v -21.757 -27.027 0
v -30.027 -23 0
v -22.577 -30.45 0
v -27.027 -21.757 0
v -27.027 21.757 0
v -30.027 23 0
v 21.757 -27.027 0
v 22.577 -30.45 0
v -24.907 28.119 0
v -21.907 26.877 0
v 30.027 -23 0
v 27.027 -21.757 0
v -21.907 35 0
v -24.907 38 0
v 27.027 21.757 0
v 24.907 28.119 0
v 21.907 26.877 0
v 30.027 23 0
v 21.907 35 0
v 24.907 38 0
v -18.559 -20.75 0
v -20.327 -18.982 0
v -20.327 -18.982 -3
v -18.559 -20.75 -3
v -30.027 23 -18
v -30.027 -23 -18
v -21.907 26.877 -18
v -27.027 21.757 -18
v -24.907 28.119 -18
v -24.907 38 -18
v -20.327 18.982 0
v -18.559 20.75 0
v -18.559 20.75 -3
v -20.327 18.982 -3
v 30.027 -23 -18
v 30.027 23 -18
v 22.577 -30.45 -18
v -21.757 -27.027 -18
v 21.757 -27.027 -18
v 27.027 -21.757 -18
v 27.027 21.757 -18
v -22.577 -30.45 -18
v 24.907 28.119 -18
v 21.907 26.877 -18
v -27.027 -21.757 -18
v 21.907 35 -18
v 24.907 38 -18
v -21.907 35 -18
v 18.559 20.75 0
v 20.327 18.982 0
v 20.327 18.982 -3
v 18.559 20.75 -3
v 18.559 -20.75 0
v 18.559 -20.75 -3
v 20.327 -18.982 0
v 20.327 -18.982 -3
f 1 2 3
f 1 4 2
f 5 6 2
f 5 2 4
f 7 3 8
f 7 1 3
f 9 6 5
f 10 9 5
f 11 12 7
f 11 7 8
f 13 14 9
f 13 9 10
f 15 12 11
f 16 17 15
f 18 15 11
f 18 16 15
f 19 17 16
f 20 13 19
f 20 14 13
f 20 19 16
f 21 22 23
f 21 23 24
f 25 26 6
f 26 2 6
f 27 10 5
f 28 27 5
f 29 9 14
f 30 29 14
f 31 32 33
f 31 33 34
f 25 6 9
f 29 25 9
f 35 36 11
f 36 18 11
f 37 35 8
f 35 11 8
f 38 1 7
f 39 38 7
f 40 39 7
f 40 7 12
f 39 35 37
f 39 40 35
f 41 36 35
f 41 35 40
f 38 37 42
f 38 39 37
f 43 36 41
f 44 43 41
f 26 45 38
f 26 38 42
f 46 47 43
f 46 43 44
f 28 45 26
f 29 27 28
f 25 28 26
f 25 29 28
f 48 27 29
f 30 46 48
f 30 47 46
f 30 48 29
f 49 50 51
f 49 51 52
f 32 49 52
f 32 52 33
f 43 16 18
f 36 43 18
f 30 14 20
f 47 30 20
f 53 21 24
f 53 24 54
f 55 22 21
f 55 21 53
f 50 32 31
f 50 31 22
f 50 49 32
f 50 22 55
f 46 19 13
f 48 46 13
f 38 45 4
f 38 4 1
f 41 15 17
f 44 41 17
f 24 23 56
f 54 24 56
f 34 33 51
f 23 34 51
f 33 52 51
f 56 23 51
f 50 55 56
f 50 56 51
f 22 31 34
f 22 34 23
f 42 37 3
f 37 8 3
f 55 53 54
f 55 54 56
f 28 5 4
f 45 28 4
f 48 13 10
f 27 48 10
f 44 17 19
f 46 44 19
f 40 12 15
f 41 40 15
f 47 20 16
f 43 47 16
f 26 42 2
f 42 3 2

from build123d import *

# Parameters (mm, degrees)
SALIENTE_EXTRUIR1_DEPTH   = 3
SALIENTE_EXTRUIR1_2_DEPTH = 3
SALIENTE_EXTRUIR3_DEPTH   = 15


with BuildPart() as part:
    # Croquis1 → Saliente-Extruir1 (new body)
    with BuildSketch(Plane.XY):
        Polygon((-24.907301525, 28.119315281), (-30.026512204, 23.000104602), (-30.026512204, -23.000104602), (-22.576616806, -30.45), (22.576616806, -30.45), (30.026512204, -23.000104602), (30.026512204, 23.000104602), (24.907301525, 28.119315281), (24.907301525, 38), (-24.907301525, 38), align=None)
        Polygon((-21.907301525, 26.876674594), (-27.026512204, 21.757463915), (-27.026512204, -21.757463915), (-21.757463915, -27.026512204), (21.757463915, -27.026512204), (27.026512204, -21.757463915), (27.026512204, 21.757463915), (21.907301525, 26.876674594), (21.907301525, 35), (-21.907301525, 35), align=None, mode=Mode.SUBTRACT)
    extrude(amount=-SALIENTE_EXTRUIR1_DEPTH)

    # Croquis2 → Saliente-Extruir3 (add)
    with BuildSketch(Plane(origin=(0, 0, -3), x_dir=(-1, 0, 0), z_dir=(0, 0, -1))):
        Polygon((-24.907301525, 28.119315281), (-30.026512204, 23.000104602), (-30.026512204, -23.000104602), (-22.576616806, -30.45), (22.576616806, -30.45), (30.026512204, -23.000104602), (30.026512204, 23.000104602), (24.907301525, 28.119315281), (24.907301525, 38), (-24.907301525, 38), align=None)
        Polygon((27.026512204, -21.757463915), (21.757463915, -27.026512204), (-21.757463915, -27.026512204), (-27.026512204, -21.757463915), (-27.026512204, 21.757463915), (-21.907301525, 26.876674594), (-21.907301525, 35), (21.907301525, 35), (21.907301525, 26.876674594), (27.026512204, 21.757463915), align=None, mode=Mode.SUBTRACT)
    extrude(amount=SALIENTE_EXTRUIR3_DEPTH)


with BuildPart() as body_2:
    # Croquis1 → Saliente-Extruir1 2 (new body)
    with BuildSketch(Plane.XY):
        Polygon((-18.558745251, 20.75), (-20.326512204, 18.982233047), (-20.326512204, -18.982233047), (-18.558745251, -20.75), (18.558745251, -20.75), (20.326512204, -18.982233047), (20.326512204, 18.982233047), (18.558745251, 20.75), align=None)
    extrude(amount=-SALIENTE_EXTRUIR1_2_DEPTH)


solid = Compound([part.part, body_2.part])
